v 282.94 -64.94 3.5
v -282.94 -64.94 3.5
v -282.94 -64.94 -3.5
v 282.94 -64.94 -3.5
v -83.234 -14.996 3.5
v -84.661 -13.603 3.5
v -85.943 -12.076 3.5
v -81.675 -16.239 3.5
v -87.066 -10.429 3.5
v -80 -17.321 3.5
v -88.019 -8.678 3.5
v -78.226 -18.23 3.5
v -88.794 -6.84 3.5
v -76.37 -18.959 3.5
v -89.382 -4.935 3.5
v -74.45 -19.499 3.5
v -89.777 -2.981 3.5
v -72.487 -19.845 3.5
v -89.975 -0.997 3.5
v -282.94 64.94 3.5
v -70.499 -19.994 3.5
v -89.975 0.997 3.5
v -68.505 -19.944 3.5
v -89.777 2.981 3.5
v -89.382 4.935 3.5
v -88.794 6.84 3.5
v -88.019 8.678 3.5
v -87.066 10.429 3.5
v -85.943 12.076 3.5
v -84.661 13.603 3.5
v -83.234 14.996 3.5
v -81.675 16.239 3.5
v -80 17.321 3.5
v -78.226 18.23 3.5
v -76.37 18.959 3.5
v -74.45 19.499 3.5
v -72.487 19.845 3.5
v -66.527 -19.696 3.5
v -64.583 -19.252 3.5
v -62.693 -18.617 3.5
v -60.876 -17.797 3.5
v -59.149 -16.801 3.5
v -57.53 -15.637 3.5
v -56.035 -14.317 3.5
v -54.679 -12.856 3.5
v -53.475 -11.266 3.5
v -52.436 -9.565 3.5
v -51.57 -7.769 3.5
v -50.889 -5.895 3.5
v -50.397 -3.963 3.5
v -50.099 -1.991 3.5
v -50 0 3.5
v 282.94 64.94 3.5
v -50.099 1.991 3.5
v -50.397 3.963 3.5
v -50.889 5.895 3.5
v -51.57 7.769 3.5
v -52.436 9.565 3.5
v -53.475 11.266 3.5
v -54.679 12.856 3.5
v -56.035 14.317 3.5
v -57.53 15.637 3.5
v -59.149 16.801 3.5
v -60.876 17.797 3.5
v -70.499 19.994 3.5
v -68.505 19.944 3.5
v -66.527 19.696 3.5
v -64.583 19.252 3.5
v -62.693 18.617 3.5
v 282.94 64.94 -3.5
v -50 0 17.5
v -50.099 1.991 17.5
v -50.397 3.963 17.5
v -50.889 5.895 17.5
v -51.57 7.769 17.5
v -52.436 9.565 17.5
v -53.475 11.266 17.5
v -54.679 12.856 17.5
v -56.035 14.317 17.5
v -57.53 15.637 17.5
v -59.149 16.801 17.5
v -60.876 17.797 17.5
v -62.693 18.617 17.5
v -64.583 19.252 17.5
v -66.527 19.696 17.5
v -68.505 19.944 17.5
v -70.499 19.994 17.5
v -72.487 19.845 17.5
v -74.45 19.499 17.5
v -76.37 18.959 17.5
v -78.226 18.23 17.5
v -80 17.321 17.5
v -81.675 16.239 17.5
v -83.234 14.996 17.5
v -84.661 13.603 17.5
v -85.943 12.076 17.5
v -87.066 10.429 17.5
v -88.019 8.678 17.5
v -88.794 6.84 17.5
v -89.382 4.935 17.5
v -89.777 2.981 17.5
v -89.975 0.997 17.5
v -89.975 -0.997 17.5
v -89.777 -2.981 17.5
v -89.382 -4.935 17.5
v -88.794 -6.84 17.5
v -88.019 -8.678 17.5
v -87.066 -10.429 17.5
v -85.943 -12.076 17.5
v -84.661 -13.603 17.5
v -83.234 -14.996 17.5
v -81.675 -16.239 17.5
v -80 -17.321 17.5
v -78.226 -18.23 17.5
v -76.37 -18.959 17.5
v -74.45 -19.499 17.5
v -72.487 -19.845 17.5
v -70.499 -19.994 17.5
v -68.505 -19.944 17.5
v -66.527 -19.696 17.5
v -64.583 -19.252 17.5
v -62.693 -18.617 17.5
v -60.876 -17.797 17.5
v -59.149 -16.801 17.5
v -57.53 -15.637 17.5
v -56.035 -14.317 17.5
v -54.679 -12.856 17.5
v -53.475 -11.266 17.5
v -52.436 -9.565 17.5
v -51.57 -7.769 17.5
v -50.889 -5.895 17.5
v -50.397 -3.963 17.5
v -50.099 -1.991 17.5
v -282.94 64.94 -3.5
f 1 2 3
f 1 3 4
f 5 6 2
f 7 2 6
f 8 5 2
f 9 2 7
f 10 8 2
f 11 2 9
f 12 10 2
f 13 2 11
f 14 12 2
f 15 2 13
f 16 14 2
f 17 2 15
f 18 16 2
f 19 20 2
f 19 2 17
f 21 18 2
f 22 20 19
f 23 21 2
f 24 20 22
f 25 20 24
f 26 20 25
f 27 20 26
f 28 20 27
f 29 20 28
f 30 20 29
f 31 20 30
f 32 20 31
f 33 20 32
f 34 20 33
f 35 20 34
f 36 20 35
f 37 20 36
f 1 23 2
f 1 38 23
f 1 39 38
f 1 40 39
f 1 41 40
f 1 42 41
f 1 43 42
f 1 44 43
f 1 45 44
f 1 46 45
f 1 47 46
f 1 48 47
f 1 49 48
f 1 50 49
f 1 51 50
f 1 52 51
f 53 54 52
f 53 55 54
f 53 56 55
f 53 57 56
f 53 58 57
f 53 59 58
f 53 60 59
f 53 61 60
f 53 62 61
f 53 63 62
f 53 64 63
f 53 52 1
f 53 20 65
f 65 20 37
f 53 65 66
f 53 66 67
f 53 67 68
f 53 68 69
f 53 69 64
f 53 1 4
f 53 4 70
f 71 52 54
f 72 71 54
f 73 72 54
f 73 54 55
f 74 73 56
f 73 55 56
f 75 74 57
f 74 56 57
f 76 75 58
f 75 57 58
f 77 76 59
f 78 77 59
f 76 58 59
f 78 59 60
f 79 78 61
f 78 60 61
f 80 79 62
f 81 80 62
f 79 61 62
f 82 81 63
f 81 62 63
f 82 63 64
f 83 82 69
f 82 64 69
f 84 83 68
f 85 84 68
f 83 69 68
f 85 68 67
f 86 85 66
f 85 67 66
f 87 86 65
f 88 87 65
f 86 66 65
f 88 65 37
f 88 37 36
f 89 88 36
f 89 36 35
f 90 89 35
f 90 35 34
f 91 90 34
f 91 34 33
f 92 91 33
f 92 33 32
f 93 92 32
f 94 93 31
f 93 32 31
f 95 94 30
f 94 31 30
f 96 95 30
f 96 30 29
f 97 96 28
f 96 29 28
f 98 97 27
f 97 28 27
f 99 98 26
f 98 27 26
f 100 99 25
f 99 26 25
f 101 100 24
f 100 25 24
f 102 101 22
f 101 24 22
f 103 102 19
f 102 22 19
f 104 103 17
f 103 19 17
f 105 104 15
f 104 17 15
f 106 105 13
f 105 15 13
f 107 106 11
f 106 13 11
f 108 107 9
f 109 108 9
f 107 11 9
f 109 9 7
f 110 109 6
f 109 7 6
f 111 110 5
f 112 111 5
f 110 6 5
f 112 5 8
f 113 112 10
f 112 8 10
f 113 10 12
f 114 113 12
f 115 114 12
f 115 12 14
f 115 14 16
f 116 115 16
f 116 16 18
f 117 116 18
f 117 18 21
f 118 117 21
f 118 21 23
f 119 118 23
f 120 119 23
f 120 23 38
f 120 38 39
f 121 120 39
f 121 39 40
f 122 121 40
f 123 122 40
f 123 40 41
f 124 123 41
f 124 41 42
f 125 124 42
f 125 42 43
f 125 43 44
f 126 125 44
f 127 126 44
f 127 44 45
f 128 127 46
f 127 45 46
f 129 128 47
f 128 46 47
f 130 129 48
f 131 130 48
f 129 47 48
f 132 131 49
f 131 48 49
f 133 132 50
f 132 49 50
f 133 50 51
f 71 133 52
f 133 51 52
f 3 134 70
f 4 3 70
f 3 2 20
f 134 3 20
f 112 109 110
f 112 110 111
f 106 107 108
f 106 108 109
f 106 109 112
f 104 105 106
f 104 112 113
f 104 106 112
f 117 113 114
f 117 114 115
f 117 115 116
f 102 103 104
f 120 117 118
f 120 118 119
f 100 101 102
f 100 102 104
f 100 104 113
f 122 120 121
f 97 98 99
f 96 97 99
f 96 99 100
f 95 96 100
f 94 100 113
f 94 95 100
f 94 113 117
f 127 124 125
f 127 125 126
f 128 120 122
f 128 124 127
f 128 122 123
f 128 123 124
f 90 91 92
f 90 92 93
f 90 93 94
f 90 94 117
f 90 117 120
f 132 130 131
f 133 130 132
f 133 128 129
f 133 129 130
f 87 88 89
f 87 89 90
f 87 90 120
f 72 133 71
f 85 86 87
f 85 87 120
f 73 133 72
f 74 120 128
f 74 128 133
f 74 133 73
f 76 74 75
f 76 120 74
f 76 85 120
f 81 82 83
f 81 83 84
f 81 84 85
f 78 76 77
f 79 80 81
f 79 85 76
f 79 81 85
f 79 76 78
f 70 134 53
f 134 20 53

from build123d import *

# Parameters (mm, degrees)
SKETCH1_W           = 565.88
SKETCH1_H           = 129.88
BOSS_EXTRUDE1_DEPTH = 3.5
SKETCH2_R           = 20
BOSS_EXTRUDE2_DEPTH = 14


with BuildPart() as part:
    # Sketch1 → Boss-Extrude1 (new, symmetric)
    with BuildSketch(Plane.XY):
        Rectangle(SKETCH1_W, SKETCH1_H)
    extrude(amount=BOSS_EXTRUDE1_DEPTH, both=True)

    # Sketch2 → Boss-Extrude2 (add)
    with BuildSketch(Plane.XY.offset(3.5)):
        with Locations((-70, 0)):
            Circle(SKETCH2_R)
    extrude(amount=BOSS_EXTRUDE2_DEPTH)


solid = part.part
